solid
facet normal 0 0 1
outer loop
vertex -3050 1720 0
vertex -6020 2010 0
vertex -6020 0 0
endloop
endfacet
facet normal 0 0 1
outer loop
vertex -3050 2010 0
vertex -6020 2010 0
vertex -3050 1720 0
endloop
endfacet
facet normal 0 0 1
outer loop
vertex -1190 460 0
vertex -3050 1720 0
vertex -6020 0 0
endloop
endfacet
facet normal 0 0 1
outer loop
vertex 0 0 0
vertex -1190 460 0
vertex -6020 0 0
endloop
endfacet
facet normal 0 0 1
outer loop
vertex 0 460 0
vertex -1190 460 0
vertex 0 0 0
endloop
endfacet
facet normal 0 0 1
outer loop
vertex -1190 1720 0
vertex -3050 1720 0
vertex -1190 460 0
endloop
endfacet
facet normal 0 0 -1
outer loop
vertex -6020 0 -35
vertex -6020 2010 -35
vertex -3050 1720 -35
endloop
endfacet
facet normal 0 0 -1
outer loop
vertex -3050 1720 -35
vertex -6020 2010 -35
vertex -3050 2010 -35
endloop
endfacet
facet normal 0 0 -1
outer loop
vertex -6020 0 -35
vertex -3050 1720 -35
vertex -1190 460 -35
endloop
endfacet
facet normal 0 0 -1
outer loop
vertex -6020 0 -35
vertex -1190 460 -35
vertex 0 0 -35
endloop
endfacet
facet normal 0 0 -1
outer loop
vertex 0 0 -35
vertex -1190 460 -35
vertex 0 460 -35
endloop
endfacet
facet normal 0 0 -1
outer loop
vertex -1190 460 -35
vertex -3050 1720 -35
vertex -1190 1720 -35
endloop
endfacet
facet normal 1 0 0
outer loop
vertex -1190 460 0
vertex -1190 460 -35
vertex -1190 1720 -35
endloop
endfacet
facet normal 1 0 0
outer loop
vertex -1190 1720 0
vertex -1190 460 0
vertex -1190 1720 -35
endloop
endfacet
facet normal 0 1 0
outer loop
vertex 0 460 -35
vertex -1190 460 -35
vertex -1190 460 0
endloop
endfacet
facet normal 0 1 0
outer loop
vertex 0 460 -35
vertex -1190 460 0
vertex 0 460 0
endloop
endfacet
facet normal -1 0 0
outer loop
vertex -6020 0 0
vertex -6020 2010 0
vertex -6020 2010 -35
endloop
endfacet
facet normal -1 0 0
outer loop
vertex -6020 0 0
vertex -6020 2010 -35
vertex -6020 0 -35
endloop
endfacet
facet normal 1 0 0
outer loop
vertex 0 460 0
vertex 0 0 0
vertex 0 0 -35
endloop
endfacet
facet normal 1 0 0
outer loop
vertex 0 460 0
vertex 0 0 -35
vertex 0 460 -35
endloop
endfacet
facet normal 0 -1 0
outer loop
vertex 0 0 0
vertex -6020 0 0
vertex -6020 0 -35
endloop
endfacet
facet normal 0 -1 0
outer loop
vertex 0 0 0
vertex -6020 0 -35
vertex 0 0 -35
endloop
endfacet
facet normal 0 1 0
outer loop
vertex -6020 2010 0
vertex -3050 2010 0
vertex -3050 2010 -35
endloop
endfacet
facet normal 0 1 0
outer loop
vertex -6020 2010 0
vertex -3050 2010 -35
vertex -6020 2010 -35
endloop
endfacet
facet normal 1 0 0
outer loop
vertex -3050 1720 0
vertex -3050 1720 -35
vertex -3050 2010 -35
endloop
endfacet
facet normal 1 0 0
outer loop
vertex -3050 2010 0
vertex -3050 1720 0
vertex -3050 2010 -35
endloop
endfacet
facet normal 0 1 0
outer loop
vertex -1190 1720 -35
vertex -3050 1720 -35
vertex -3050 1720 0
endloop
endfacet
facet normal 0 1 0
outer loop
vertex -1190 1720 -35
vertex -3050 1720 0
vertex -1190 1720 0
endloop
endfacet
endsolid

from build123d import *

# Parameters (mm, degrees)
TABAN_FLAN_1_DEPTH         = 35
KES_EKSTR_ZYON1_DEPTH      = 6347.788558003
KES_EKSTR_ZYON1_DEPTH_BACK = 6347.788558003
IZIM2_W                    = 360
IZIM2_H                    = 1260
KES_EKSTR_ZYON2_DEPTH      = 6347.788558003
KES_EKSTR_ZYON2_DEPTH_BACK = 6347.788558003
IZIM3_W                    = 570
IZIM3_H                    = 1260
IZIM3_W_2                  = 5
IZIM3_H_2                  = 290
KES_EKSTR_ZYON3_DEPTH      = 6347.788558003
KES_EKSTR_ZYON3_DEPTH_BACK = 6347.788558003
IZIM4_W                    = 260
IZIM4_H                    = 1260


# Sheet-metal steps are written as plain solids
with BuildPart() as part:
    # Çizim1 → Taban-Flanş1 (new body)
    with BuildSketch(Plane.XY):
        Polygon((0, 0), (0, 1720), (-3045, 1720), (-3045, 2010), (-6020, 2010), (-6020, 0), align=None)
    extrude(amount=-TABAN_FLAN_1_DEPTH)

    # Çizim2 → Kes-Ekstrüzyon1 (cut, two sides: drawn at the far end of the back side and taken through both)
    with BuildSketch(Plane.XY.offset(-KES_EKSTR_ZYON1_DEPTH_BACK)):
        with Locations((-180, 1090)):
            Rectangle(IZIM2_W, IZIM2_H)
    extrude(amount=KES_EKSTR_ZYON1_DEPTH + KES_EKSTR_ZYON1_DEPTH_BACK, mode=Mode.SUBTRACT)

    # Çizim3 → Kes-Ekstrüzyon2 (cut, two sides: drawn at the far end of the back side and taken through both)
    with BuildSketch(Plane.XY.offset(-KES_EKSTR_ZYON2_DEPTH_BACK)):
        with Locations((-645, 1090)):
            Rectangle(IZIM3_W, IZIM3_H)
        with Locations((-3047.5, 1865)):
            Rectangle(IZIM3_W_2, IZIM3_H_2)
    extrude(amount=KES_EKSTR_ZYON2_DEPTH + KES_EKSTR_ZYON2_DEPTH_BACK, mode=Mode.SUBTRACT)

    # Çizim4 → Kes-Ekstrüzyon3 (cut, two sides: drawn at the far end of the back side and taken through both)
    with BuildSketch(Plane.XY.offset(-KES_EKSTR_ZYON3_DEPTH_BACK)):
        with Locations((-1060, 1090)):
            Rectangle(IZIM4_W, IZIM4_H)
    extrude(amount=KES_EKSTR_ZYON3_DEPTH + KES_EKSTR_ZYON3_DEPTH_BACK, mode=Mode.SUBTRACT)


solid = part.part
